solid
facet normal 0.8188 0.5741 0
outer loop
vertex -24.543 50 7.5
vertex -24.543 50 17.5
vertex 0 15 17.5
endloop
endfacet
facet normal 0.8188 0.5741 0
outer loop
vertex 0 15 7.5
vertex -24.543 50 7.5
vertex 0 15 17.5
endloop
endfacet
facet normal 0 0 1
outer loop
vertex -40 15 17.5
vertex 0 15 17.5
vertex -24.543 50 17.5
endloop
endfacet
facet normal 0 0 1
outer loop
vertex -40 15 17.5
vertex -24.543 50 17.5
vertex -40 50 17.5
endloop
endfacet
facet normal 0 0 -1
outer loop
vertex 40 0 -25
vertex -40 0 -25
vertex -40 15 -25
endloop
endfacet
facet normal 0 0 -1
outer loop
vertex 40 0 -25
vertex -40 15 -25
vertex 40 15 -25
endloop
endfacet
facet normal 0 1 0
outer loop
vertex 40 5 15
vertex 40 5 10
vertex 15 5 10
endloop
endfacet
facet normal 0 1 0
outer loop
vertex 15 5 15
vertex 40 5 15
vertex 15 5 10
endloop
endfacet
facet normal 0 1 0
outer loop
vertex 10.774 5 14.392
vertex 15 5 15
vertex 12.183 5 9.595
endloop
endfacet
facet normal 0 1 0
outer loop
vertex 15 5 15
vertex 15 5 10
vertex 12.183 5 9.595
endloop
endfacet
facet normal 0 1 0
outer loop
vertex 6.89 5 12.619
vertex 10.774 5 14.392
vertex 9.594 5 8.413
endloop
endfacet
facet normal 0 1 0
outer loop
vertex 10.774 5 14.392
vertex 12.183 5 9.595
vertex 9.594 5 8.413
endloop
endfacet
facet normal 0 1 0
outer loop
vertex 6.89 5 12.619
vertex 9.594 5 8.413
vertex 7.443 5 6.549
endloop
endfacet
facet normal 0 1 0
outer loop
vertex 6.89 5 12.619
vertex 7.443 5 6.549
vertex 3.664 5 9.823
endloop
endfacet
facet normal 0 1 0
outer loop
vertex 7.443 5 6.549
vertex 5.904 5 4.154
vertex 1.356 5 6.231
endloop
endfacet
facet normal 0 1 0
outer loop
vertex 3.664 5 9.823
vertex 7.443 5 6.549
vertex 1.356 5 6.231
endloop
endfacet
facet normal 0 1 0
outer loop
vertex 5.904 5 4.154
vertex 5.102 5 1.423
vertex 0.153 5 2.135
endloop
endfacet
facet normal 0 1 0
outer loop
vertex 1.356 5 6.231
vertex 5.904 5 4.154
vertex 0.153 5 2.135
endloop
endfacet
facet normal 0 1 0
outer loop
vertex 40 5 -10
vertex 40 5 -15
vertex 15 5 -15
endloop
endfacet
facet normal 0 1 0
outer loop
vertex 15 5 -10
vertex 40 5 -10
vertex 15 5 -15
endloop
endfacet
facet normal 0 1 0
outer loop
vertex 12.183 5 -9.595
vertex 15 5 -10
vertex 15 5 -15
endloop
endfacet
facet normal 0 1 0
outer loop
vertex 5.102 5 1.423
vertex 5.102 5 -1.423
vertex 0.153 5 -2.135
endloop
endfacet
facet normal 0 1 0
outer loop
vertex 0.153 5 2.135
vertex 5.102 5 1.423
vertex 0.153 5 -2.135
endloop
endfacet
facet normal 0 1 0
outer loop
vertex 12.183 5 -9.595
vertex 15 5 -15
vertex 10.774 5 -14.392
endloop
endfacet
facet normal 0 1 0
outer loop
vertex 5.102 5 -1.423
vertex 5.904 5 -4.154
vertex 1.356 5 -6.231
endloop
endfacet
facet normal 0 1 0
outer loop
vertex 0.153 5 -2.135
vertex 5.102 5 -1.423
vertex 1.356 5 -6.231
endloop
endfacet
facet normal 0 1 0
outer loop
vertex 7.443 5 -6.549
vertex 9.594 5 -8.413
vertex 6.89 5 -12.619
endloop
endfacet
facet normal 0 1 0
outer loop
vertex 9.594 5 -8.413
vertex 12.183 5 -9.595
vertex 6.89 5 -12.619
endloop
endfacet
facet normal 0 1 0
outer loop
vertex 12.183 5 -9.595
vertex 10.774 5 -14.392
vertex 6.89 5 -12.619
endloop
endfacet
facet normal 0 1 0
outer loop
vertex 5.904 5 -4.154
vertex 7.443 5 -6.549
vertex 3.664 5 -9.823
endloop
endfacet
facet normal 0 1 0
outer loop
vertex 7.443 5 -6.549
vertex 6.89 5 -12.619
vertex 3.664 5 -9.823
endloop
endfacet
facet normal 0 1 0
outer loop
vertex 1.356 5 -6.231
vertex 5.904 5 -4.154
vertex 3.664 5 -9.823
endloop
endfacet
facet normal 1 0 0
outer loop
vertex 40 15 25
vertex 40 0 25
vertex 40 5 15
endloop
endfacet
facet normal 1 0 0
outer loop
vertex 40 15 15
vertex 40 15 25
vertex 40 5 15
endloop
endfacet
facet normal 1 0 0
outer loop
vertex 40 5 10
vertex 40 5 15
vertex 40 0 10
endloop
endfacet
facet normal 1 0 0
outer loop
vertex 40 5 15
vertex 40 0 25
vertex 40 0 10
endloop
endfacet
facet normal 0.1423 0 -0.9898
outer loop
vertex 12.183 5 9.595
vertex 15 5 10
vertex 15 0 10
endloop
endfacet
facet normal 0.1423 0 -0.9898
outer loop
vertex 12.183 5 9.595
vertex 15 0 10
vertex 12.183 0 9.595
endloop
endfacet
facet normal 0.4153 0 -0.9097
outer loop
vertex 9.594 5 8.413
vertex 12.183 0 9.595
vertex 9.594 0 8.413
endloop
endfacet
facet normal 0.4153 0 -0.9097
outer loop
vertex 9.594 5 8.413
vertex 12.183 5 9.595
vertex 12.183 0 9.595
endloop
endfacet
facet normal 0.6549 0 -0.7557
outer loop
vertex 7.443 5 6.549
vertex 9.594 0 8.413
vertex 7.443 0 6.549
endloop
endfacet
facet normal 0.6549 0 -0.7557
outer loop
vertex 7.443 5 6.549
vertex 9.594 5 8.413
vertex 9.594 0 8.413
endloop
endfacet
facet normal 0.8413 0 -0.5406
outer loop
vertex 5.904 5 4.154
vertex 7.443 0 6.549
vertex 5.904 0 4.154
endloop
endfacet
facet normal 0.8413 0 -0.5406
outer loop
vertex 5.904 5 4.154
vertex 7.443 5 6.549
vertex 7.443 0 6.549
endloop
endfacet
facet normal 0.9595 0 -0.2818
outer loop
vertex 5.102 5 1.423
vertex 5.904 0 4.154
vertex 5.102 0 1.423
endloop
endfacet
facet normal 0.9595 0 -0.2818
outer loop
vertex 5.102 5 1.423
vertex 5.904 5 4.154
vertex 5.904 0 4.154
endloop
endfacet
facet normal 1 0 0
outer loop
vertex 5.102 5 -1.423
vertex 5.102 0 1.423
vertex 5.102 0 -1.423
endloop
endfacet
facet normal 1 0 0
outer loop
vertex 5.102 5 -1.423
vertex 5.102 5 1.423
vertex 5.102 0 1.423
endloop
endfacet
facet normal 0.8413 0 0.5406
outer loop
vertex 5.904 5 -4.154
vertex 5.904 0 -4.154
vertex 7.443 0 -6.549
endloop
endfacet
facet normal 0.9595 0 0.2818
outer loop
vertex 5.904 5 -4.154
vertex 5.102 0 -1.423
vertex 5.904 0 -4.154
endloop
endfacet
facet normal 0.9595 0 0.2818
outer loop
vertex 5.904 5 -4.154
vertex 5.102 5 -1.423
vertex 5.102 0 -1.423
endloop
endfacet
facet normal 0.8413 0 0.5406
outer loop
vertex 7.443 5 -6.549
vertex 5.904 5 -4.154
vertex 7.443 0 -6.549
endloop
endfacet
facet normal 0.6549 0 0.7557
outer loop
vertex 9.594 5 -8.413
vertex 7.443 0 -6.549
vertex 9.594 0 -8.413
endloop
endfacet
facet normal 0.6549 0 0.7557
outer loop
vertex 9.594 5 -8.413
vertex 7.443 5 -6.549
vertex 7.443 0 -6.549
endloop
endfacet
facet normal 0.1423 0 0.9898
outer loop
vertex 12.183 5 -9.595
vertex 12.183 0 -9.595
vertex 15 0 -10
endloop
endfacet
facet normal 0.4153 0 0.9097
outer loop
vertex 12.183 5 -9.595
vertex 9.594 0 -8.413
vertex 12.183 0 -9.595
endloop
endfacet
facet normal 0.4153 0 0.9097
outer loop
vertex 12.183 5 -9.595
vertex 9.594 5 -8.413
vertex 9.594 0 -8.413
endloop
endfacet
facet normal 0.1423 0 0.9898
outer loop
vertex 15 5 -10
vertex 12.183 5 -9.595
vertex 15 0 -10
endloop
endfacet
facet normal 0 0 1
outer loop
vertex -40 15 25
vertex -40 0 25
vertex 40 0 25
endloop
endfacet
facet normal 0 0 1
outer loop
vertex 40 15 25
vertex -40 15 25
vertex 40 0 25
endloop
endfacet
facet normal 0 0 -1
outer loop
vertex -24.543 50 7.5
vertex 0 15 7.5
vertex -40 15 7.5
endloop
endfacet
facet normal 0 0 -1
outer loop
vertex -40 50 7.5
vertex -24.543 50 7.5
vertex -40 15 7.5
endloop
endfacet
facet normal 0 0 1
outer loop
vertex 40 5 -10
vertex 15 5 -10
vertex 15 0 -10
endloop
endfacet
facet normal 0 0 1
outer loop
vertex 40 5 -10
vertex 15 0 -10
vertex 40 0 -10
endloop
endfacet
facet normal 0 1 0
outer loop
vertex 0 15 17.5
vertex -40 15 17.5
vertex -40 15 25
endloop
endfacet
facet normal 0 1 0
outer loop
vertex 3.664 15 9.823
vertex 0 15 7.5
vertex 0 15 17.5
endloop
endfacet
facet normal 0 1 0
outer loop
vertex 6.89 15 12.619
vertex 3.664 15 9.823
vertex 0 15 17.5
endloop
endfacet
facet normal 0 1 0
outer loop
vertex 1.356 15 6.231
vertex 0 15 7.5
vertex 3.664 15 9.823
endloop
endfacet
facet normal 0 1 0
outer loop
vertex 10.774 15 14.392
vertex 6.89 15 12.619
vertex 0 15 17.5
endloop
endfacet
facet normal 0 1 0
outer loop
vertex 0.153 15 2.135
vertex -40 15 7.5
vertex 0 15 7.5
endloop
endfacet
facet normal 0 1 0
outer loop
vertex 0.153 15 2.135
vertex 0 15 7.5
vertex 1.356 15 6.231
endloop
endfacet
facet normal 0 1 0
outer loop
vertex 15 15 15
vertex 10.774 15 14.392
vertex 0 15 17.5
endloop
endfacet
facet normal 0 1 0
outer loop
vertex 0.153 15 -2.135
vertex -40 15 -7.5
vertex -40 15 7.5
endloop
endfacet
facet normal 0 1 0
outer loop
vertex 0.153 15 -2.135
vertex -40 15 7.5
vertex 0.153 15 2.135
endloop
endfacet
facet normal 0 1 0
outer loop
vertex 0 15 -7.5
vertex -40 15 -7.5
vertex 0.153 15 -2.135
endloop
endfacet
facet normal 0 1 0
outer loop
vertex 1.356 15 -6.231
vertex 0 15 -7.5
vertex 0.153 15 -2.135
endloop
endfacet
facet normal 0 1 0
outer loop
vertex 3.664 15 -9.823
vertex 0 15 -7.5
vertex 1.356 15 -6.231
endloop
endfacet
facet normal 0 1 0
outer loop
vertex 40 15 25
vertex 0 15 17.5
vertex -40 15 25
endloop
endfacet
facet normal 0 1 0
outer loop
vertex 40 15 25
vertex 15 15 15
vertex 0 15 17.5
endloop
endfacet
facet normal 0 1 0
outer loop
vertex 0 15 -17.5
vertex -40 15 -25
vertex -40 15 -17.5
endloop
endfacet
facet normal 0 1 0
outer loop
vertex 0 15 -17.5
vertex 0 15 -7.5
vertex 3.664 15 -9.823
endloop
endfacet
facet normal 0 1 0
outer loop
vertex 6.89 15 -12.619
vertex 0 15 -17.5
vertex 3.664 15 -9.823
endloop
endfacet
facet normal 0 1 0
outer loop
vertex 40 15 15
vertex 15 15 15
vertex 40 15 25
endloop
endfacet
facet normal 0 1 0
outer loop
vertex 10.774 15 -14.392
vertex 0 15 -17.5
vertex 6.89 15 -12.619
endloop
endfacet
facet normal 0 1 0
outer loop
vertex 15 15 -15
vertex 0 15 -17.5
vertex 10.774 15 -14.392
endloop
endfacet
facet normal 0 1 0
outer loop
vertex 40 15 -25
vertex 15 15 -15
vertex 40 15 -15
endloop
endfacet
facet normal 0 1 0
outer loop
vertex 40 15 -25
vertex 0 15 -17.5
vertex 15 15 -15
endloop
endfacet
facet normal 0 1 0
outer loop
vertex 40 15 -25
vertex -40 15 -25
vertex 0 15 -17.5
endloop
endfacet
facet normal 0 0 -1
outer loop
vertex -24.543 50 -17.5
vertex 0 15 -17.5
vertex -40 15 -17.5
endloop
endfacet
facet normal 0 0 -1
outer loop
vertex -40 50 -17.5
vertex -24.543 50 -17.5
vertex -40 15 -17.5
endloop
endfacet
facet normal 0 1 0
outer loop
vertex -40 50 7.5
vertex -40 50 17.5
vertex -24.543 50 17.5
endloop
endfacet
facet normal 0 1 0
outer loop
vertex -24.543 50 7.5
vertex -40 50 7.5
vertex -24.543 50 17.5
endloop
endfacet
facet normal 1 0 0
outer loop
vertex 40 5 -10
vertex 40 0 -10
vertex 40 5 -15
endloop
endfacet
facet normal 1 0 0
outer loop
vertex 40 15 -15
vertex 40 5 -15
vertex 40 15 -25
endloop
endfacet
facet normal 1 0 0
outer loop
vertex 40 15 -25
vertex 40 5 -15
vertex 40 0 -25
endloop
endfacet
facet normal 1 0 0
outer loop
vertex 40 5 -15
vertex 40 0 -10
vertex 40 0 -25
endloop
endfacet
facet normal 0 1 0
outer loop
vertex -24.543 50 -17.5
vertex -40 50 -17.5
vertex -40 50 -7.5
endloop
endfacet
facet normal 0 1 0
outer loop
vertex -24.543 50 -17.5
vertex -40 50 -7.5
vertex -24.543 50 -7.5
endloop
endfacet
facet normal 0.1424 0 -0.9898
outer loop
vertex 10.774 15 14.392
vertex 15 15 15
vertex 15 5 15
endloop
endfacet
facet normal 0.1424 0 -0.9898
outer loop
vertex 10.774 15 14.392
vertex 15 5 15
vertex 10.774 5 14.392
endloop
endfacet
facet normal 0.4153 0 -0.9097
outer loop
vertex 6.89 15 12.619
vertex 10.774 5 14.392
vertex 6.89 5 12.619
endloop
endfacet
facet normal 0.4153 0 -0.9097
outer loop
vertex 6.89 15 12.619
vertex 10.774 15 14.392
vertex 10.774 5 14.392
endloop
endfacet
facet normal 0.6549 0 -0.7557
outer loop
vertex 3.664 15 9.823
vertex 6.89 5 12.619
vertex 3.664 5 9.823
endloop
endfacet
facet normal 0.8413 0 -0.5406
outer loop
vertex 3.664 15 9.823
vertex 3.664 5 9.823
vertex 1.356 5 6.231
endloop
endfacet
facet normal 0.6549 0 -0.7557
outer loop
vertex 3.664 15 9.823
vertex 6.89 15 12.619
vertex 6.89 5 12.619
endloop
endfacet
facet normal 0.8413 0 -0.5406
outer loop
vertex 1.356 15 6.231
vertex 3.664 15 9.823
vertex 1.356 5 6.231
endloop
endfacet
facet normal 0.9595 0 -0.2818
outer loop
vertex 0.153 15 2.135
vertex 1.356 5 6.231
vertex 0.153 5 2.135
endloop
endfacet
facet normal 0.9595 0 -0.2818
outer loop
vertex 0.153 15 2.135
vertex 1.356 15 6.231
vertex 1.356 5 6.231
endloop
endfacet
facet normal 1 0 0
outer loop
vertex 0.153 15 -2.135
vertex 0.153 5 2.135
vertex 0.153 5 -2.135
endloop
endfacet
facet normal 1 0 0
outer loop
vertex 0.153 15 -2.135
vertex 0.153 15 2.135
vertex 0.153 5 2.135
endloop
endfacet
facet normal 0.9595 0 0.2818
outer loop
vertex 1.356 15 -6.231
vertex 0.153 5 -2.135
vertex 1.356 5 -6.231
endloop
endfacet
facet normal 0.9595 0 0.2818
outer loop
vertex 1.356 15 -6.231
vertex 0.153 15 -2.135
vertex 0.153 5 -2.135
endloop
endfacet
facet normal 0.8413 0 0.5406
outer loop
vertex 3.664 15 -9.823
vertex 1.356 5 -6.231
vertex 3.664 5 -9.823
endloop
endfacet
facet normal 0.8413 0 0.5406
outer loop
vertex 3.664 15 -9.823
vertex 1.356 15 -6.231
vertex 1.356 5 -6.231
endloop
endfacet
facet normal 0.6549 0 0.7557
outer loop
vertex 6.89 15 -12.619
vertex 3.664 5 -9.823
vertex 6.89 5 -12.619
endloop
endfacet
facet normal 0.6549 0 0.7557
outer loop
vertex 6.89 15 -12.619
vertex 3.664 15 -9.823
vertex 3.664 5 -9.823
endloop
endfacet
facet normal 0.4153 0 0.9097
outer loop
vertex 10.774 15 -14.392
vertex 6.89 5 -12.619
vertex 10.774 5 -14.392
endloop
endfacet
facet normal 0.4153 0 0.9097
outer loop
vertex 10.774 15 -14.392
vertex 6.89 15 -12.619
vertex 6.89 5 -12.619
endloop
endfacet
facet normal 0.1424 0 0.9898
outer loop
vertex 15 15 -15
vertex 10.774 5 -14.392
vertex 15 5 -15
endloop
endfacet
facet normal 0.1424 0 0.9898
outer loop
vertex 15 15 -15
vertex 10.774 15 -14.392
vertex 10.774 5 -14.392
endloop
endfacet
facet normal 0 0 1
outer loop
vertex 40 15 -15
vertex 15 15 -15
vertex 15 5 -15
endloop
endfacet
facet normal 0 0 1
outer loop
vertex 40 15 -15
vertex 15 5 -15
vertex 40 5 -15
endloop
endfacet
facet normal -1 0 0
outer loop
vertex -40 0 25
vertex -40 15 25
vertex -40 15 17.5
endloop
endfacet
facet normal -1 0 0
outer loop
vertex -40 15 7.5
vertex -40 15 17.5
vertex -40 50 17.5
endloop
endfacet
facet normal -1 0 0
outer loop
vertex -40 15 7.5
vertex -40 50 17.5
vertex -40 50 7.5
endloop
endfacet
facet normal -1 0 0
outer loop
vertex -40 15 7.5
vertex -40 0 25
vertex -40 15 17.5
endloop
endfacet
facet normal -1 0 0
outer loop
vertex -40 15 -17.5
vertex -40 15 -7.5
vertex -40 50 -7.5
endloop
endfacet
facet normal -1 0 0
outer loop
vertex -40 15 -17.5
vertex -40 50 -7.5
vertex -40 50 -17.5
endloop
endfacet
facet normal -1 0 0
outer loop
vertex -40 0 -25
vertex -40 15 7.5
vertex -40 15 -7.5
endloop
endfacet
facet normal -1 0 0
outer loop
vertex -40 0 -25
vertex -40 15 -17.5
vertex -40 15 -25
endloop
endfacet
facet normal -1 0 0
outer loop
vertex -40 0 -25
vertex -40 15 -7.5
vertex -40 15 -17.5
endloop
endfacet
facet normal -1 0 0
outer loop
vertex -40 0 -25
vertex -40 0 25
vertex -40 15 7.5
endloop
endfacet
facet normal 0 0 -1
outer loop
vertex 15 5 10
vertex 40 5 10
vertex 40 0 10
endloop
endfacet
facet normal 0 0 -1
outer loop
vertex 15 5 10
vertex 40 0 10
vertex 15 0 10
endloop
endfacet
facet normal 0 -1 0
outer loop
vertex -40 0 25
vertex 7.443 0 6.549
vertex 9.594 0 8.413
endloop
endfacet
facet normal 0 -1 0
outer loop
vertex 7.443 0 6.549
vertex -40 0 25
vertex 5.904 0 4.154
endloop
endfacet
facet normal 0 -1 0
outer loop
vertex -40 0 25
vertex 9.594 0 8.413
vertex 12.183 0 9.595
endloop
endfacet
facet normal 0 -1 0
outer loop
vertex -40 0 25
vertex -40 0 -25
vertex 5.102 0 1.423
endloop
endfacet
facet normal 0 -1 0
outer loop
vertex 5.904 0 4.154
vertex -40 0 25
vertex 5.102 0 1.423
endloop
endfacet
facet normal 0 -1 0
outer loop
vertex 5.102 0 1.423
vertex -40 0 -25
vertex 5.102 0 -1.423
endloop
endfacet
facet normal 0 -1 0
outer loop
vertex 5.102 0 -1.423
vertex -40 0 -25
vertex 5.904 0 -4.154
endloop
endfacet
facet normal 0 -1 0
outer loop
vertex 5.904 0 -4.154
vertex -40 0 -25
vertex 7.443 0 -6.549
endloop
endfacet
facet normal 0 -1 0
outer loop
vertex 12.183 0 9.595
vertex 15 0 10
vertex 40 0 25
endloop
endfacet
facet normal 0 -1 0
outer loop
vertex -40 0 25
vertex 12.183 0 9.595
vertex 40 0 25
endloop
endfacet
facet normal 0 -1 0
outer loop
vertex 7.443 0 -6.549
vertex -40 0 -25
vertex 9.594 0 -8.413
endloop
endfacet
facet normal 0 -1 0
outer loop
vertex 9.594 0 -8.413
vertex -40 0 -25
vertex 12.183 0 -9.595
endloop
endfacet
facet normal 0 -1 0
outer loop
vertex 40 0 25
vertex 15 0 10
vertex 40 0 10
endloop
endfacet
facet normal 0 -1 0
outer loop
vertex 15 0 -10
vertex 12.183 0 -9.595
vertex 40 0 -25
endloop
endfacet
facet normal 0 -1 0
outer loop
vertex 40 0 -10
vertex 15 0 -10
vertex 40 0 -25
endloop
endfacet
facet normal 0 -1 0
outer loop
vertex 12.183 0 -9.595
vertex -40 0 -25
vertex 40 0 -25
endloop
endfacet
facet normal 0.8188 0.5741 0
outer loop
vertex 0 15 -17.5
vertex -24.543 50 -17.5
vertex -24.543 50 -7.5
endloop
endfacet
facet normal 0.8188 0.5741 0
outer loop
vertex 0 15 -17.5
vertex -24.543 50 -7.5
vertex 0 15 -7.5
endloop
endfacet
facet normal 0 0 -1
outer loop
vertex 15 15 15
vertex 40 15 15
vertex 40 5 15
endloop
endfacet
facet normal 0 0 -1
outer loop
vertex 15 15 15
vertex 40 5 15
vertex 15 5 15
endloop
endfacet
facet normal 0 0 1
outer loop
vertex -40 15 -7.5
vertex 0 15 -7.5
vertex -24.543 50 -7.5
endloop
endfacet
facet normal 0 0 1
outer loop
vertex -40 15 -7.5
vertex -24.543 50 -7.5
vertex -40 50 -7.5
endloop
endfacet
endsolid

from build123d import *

# Parameters (mm, degrees)
SKETCH1_W           = 80
SKETCH1_H           = 50
BOSS_EXTRUDE1_DEPTH = 15
CUT_EXTRUDE2_DEPTH  = 10
CUT_EXTRUDE3_DEPTH  = 10
BOSS_EXTRUDE2_DEPTH = 10


with BuildPart() as part:
    # Sketch1 → Boss-Extrude1 (new body)
    with BuildSketch(Plane(origin=(0, 0, 0), x_dir=(1, 0, 0), z_dir=(0, 1, 0))):
        Rectangle(SKETCH1_W, SKETCH1_H)
    extrude(amount=BOSS_EXTRUDE1_DEPTH)

    # Sketch6 → Cut-Extrude2 (cut)
    with BuildSketch(Plane(origin=(0, 15, 0), x_dir=(1, 0, 0), z_dir=(0, 1, 0))):
        with BuildLine():
            Line((40, -15), (15, -15))
            ThreePointArc((15, -15), (0, 0), (15, 15))
            Line((15, 15), (40, 15))
            Line((40, 15), (40, -15))
        make_face()
    extrude(amount=-CUT_EXTRUDE2_DEPTH, mode=Mode.SUBTRACT)

    # Sketch8 → Cut-Extrude3 (cut)
    with BuildSketch(Plane(origin=(0, 5, 0), x_dir=(1, 0, 0), z_dir=(0, 1, 0))):
        with BuildLine():
            Line((40, -10), (15, -10))
            ThreePointArc((15, -10), (5, 0), (15, 10))
            Line((15, 10), (40, 10))
            Line((40, 10), (40, -10))
        make_face()
    extrude(amount=-CUT_EXTRUDE3_DEPTH, mode=Mode.SUBTRACT)

    # Sketch9 → Boss-Extrude2 (add)
    with BuildSketch(Plane.XY.offset(17.5)):
        Polygon((-40, 15), (-40, 50), (-24.543301065, 50), (0, 15), align=None)
    boss_extrude2 = extrude(amount=-BOSS_EXTRUDE2_DEPTH)

    # Mirror1: Boss-Extrude2 across plane
    add(boss_extrude2.mirror(Plane.XY))


solid = part.part
